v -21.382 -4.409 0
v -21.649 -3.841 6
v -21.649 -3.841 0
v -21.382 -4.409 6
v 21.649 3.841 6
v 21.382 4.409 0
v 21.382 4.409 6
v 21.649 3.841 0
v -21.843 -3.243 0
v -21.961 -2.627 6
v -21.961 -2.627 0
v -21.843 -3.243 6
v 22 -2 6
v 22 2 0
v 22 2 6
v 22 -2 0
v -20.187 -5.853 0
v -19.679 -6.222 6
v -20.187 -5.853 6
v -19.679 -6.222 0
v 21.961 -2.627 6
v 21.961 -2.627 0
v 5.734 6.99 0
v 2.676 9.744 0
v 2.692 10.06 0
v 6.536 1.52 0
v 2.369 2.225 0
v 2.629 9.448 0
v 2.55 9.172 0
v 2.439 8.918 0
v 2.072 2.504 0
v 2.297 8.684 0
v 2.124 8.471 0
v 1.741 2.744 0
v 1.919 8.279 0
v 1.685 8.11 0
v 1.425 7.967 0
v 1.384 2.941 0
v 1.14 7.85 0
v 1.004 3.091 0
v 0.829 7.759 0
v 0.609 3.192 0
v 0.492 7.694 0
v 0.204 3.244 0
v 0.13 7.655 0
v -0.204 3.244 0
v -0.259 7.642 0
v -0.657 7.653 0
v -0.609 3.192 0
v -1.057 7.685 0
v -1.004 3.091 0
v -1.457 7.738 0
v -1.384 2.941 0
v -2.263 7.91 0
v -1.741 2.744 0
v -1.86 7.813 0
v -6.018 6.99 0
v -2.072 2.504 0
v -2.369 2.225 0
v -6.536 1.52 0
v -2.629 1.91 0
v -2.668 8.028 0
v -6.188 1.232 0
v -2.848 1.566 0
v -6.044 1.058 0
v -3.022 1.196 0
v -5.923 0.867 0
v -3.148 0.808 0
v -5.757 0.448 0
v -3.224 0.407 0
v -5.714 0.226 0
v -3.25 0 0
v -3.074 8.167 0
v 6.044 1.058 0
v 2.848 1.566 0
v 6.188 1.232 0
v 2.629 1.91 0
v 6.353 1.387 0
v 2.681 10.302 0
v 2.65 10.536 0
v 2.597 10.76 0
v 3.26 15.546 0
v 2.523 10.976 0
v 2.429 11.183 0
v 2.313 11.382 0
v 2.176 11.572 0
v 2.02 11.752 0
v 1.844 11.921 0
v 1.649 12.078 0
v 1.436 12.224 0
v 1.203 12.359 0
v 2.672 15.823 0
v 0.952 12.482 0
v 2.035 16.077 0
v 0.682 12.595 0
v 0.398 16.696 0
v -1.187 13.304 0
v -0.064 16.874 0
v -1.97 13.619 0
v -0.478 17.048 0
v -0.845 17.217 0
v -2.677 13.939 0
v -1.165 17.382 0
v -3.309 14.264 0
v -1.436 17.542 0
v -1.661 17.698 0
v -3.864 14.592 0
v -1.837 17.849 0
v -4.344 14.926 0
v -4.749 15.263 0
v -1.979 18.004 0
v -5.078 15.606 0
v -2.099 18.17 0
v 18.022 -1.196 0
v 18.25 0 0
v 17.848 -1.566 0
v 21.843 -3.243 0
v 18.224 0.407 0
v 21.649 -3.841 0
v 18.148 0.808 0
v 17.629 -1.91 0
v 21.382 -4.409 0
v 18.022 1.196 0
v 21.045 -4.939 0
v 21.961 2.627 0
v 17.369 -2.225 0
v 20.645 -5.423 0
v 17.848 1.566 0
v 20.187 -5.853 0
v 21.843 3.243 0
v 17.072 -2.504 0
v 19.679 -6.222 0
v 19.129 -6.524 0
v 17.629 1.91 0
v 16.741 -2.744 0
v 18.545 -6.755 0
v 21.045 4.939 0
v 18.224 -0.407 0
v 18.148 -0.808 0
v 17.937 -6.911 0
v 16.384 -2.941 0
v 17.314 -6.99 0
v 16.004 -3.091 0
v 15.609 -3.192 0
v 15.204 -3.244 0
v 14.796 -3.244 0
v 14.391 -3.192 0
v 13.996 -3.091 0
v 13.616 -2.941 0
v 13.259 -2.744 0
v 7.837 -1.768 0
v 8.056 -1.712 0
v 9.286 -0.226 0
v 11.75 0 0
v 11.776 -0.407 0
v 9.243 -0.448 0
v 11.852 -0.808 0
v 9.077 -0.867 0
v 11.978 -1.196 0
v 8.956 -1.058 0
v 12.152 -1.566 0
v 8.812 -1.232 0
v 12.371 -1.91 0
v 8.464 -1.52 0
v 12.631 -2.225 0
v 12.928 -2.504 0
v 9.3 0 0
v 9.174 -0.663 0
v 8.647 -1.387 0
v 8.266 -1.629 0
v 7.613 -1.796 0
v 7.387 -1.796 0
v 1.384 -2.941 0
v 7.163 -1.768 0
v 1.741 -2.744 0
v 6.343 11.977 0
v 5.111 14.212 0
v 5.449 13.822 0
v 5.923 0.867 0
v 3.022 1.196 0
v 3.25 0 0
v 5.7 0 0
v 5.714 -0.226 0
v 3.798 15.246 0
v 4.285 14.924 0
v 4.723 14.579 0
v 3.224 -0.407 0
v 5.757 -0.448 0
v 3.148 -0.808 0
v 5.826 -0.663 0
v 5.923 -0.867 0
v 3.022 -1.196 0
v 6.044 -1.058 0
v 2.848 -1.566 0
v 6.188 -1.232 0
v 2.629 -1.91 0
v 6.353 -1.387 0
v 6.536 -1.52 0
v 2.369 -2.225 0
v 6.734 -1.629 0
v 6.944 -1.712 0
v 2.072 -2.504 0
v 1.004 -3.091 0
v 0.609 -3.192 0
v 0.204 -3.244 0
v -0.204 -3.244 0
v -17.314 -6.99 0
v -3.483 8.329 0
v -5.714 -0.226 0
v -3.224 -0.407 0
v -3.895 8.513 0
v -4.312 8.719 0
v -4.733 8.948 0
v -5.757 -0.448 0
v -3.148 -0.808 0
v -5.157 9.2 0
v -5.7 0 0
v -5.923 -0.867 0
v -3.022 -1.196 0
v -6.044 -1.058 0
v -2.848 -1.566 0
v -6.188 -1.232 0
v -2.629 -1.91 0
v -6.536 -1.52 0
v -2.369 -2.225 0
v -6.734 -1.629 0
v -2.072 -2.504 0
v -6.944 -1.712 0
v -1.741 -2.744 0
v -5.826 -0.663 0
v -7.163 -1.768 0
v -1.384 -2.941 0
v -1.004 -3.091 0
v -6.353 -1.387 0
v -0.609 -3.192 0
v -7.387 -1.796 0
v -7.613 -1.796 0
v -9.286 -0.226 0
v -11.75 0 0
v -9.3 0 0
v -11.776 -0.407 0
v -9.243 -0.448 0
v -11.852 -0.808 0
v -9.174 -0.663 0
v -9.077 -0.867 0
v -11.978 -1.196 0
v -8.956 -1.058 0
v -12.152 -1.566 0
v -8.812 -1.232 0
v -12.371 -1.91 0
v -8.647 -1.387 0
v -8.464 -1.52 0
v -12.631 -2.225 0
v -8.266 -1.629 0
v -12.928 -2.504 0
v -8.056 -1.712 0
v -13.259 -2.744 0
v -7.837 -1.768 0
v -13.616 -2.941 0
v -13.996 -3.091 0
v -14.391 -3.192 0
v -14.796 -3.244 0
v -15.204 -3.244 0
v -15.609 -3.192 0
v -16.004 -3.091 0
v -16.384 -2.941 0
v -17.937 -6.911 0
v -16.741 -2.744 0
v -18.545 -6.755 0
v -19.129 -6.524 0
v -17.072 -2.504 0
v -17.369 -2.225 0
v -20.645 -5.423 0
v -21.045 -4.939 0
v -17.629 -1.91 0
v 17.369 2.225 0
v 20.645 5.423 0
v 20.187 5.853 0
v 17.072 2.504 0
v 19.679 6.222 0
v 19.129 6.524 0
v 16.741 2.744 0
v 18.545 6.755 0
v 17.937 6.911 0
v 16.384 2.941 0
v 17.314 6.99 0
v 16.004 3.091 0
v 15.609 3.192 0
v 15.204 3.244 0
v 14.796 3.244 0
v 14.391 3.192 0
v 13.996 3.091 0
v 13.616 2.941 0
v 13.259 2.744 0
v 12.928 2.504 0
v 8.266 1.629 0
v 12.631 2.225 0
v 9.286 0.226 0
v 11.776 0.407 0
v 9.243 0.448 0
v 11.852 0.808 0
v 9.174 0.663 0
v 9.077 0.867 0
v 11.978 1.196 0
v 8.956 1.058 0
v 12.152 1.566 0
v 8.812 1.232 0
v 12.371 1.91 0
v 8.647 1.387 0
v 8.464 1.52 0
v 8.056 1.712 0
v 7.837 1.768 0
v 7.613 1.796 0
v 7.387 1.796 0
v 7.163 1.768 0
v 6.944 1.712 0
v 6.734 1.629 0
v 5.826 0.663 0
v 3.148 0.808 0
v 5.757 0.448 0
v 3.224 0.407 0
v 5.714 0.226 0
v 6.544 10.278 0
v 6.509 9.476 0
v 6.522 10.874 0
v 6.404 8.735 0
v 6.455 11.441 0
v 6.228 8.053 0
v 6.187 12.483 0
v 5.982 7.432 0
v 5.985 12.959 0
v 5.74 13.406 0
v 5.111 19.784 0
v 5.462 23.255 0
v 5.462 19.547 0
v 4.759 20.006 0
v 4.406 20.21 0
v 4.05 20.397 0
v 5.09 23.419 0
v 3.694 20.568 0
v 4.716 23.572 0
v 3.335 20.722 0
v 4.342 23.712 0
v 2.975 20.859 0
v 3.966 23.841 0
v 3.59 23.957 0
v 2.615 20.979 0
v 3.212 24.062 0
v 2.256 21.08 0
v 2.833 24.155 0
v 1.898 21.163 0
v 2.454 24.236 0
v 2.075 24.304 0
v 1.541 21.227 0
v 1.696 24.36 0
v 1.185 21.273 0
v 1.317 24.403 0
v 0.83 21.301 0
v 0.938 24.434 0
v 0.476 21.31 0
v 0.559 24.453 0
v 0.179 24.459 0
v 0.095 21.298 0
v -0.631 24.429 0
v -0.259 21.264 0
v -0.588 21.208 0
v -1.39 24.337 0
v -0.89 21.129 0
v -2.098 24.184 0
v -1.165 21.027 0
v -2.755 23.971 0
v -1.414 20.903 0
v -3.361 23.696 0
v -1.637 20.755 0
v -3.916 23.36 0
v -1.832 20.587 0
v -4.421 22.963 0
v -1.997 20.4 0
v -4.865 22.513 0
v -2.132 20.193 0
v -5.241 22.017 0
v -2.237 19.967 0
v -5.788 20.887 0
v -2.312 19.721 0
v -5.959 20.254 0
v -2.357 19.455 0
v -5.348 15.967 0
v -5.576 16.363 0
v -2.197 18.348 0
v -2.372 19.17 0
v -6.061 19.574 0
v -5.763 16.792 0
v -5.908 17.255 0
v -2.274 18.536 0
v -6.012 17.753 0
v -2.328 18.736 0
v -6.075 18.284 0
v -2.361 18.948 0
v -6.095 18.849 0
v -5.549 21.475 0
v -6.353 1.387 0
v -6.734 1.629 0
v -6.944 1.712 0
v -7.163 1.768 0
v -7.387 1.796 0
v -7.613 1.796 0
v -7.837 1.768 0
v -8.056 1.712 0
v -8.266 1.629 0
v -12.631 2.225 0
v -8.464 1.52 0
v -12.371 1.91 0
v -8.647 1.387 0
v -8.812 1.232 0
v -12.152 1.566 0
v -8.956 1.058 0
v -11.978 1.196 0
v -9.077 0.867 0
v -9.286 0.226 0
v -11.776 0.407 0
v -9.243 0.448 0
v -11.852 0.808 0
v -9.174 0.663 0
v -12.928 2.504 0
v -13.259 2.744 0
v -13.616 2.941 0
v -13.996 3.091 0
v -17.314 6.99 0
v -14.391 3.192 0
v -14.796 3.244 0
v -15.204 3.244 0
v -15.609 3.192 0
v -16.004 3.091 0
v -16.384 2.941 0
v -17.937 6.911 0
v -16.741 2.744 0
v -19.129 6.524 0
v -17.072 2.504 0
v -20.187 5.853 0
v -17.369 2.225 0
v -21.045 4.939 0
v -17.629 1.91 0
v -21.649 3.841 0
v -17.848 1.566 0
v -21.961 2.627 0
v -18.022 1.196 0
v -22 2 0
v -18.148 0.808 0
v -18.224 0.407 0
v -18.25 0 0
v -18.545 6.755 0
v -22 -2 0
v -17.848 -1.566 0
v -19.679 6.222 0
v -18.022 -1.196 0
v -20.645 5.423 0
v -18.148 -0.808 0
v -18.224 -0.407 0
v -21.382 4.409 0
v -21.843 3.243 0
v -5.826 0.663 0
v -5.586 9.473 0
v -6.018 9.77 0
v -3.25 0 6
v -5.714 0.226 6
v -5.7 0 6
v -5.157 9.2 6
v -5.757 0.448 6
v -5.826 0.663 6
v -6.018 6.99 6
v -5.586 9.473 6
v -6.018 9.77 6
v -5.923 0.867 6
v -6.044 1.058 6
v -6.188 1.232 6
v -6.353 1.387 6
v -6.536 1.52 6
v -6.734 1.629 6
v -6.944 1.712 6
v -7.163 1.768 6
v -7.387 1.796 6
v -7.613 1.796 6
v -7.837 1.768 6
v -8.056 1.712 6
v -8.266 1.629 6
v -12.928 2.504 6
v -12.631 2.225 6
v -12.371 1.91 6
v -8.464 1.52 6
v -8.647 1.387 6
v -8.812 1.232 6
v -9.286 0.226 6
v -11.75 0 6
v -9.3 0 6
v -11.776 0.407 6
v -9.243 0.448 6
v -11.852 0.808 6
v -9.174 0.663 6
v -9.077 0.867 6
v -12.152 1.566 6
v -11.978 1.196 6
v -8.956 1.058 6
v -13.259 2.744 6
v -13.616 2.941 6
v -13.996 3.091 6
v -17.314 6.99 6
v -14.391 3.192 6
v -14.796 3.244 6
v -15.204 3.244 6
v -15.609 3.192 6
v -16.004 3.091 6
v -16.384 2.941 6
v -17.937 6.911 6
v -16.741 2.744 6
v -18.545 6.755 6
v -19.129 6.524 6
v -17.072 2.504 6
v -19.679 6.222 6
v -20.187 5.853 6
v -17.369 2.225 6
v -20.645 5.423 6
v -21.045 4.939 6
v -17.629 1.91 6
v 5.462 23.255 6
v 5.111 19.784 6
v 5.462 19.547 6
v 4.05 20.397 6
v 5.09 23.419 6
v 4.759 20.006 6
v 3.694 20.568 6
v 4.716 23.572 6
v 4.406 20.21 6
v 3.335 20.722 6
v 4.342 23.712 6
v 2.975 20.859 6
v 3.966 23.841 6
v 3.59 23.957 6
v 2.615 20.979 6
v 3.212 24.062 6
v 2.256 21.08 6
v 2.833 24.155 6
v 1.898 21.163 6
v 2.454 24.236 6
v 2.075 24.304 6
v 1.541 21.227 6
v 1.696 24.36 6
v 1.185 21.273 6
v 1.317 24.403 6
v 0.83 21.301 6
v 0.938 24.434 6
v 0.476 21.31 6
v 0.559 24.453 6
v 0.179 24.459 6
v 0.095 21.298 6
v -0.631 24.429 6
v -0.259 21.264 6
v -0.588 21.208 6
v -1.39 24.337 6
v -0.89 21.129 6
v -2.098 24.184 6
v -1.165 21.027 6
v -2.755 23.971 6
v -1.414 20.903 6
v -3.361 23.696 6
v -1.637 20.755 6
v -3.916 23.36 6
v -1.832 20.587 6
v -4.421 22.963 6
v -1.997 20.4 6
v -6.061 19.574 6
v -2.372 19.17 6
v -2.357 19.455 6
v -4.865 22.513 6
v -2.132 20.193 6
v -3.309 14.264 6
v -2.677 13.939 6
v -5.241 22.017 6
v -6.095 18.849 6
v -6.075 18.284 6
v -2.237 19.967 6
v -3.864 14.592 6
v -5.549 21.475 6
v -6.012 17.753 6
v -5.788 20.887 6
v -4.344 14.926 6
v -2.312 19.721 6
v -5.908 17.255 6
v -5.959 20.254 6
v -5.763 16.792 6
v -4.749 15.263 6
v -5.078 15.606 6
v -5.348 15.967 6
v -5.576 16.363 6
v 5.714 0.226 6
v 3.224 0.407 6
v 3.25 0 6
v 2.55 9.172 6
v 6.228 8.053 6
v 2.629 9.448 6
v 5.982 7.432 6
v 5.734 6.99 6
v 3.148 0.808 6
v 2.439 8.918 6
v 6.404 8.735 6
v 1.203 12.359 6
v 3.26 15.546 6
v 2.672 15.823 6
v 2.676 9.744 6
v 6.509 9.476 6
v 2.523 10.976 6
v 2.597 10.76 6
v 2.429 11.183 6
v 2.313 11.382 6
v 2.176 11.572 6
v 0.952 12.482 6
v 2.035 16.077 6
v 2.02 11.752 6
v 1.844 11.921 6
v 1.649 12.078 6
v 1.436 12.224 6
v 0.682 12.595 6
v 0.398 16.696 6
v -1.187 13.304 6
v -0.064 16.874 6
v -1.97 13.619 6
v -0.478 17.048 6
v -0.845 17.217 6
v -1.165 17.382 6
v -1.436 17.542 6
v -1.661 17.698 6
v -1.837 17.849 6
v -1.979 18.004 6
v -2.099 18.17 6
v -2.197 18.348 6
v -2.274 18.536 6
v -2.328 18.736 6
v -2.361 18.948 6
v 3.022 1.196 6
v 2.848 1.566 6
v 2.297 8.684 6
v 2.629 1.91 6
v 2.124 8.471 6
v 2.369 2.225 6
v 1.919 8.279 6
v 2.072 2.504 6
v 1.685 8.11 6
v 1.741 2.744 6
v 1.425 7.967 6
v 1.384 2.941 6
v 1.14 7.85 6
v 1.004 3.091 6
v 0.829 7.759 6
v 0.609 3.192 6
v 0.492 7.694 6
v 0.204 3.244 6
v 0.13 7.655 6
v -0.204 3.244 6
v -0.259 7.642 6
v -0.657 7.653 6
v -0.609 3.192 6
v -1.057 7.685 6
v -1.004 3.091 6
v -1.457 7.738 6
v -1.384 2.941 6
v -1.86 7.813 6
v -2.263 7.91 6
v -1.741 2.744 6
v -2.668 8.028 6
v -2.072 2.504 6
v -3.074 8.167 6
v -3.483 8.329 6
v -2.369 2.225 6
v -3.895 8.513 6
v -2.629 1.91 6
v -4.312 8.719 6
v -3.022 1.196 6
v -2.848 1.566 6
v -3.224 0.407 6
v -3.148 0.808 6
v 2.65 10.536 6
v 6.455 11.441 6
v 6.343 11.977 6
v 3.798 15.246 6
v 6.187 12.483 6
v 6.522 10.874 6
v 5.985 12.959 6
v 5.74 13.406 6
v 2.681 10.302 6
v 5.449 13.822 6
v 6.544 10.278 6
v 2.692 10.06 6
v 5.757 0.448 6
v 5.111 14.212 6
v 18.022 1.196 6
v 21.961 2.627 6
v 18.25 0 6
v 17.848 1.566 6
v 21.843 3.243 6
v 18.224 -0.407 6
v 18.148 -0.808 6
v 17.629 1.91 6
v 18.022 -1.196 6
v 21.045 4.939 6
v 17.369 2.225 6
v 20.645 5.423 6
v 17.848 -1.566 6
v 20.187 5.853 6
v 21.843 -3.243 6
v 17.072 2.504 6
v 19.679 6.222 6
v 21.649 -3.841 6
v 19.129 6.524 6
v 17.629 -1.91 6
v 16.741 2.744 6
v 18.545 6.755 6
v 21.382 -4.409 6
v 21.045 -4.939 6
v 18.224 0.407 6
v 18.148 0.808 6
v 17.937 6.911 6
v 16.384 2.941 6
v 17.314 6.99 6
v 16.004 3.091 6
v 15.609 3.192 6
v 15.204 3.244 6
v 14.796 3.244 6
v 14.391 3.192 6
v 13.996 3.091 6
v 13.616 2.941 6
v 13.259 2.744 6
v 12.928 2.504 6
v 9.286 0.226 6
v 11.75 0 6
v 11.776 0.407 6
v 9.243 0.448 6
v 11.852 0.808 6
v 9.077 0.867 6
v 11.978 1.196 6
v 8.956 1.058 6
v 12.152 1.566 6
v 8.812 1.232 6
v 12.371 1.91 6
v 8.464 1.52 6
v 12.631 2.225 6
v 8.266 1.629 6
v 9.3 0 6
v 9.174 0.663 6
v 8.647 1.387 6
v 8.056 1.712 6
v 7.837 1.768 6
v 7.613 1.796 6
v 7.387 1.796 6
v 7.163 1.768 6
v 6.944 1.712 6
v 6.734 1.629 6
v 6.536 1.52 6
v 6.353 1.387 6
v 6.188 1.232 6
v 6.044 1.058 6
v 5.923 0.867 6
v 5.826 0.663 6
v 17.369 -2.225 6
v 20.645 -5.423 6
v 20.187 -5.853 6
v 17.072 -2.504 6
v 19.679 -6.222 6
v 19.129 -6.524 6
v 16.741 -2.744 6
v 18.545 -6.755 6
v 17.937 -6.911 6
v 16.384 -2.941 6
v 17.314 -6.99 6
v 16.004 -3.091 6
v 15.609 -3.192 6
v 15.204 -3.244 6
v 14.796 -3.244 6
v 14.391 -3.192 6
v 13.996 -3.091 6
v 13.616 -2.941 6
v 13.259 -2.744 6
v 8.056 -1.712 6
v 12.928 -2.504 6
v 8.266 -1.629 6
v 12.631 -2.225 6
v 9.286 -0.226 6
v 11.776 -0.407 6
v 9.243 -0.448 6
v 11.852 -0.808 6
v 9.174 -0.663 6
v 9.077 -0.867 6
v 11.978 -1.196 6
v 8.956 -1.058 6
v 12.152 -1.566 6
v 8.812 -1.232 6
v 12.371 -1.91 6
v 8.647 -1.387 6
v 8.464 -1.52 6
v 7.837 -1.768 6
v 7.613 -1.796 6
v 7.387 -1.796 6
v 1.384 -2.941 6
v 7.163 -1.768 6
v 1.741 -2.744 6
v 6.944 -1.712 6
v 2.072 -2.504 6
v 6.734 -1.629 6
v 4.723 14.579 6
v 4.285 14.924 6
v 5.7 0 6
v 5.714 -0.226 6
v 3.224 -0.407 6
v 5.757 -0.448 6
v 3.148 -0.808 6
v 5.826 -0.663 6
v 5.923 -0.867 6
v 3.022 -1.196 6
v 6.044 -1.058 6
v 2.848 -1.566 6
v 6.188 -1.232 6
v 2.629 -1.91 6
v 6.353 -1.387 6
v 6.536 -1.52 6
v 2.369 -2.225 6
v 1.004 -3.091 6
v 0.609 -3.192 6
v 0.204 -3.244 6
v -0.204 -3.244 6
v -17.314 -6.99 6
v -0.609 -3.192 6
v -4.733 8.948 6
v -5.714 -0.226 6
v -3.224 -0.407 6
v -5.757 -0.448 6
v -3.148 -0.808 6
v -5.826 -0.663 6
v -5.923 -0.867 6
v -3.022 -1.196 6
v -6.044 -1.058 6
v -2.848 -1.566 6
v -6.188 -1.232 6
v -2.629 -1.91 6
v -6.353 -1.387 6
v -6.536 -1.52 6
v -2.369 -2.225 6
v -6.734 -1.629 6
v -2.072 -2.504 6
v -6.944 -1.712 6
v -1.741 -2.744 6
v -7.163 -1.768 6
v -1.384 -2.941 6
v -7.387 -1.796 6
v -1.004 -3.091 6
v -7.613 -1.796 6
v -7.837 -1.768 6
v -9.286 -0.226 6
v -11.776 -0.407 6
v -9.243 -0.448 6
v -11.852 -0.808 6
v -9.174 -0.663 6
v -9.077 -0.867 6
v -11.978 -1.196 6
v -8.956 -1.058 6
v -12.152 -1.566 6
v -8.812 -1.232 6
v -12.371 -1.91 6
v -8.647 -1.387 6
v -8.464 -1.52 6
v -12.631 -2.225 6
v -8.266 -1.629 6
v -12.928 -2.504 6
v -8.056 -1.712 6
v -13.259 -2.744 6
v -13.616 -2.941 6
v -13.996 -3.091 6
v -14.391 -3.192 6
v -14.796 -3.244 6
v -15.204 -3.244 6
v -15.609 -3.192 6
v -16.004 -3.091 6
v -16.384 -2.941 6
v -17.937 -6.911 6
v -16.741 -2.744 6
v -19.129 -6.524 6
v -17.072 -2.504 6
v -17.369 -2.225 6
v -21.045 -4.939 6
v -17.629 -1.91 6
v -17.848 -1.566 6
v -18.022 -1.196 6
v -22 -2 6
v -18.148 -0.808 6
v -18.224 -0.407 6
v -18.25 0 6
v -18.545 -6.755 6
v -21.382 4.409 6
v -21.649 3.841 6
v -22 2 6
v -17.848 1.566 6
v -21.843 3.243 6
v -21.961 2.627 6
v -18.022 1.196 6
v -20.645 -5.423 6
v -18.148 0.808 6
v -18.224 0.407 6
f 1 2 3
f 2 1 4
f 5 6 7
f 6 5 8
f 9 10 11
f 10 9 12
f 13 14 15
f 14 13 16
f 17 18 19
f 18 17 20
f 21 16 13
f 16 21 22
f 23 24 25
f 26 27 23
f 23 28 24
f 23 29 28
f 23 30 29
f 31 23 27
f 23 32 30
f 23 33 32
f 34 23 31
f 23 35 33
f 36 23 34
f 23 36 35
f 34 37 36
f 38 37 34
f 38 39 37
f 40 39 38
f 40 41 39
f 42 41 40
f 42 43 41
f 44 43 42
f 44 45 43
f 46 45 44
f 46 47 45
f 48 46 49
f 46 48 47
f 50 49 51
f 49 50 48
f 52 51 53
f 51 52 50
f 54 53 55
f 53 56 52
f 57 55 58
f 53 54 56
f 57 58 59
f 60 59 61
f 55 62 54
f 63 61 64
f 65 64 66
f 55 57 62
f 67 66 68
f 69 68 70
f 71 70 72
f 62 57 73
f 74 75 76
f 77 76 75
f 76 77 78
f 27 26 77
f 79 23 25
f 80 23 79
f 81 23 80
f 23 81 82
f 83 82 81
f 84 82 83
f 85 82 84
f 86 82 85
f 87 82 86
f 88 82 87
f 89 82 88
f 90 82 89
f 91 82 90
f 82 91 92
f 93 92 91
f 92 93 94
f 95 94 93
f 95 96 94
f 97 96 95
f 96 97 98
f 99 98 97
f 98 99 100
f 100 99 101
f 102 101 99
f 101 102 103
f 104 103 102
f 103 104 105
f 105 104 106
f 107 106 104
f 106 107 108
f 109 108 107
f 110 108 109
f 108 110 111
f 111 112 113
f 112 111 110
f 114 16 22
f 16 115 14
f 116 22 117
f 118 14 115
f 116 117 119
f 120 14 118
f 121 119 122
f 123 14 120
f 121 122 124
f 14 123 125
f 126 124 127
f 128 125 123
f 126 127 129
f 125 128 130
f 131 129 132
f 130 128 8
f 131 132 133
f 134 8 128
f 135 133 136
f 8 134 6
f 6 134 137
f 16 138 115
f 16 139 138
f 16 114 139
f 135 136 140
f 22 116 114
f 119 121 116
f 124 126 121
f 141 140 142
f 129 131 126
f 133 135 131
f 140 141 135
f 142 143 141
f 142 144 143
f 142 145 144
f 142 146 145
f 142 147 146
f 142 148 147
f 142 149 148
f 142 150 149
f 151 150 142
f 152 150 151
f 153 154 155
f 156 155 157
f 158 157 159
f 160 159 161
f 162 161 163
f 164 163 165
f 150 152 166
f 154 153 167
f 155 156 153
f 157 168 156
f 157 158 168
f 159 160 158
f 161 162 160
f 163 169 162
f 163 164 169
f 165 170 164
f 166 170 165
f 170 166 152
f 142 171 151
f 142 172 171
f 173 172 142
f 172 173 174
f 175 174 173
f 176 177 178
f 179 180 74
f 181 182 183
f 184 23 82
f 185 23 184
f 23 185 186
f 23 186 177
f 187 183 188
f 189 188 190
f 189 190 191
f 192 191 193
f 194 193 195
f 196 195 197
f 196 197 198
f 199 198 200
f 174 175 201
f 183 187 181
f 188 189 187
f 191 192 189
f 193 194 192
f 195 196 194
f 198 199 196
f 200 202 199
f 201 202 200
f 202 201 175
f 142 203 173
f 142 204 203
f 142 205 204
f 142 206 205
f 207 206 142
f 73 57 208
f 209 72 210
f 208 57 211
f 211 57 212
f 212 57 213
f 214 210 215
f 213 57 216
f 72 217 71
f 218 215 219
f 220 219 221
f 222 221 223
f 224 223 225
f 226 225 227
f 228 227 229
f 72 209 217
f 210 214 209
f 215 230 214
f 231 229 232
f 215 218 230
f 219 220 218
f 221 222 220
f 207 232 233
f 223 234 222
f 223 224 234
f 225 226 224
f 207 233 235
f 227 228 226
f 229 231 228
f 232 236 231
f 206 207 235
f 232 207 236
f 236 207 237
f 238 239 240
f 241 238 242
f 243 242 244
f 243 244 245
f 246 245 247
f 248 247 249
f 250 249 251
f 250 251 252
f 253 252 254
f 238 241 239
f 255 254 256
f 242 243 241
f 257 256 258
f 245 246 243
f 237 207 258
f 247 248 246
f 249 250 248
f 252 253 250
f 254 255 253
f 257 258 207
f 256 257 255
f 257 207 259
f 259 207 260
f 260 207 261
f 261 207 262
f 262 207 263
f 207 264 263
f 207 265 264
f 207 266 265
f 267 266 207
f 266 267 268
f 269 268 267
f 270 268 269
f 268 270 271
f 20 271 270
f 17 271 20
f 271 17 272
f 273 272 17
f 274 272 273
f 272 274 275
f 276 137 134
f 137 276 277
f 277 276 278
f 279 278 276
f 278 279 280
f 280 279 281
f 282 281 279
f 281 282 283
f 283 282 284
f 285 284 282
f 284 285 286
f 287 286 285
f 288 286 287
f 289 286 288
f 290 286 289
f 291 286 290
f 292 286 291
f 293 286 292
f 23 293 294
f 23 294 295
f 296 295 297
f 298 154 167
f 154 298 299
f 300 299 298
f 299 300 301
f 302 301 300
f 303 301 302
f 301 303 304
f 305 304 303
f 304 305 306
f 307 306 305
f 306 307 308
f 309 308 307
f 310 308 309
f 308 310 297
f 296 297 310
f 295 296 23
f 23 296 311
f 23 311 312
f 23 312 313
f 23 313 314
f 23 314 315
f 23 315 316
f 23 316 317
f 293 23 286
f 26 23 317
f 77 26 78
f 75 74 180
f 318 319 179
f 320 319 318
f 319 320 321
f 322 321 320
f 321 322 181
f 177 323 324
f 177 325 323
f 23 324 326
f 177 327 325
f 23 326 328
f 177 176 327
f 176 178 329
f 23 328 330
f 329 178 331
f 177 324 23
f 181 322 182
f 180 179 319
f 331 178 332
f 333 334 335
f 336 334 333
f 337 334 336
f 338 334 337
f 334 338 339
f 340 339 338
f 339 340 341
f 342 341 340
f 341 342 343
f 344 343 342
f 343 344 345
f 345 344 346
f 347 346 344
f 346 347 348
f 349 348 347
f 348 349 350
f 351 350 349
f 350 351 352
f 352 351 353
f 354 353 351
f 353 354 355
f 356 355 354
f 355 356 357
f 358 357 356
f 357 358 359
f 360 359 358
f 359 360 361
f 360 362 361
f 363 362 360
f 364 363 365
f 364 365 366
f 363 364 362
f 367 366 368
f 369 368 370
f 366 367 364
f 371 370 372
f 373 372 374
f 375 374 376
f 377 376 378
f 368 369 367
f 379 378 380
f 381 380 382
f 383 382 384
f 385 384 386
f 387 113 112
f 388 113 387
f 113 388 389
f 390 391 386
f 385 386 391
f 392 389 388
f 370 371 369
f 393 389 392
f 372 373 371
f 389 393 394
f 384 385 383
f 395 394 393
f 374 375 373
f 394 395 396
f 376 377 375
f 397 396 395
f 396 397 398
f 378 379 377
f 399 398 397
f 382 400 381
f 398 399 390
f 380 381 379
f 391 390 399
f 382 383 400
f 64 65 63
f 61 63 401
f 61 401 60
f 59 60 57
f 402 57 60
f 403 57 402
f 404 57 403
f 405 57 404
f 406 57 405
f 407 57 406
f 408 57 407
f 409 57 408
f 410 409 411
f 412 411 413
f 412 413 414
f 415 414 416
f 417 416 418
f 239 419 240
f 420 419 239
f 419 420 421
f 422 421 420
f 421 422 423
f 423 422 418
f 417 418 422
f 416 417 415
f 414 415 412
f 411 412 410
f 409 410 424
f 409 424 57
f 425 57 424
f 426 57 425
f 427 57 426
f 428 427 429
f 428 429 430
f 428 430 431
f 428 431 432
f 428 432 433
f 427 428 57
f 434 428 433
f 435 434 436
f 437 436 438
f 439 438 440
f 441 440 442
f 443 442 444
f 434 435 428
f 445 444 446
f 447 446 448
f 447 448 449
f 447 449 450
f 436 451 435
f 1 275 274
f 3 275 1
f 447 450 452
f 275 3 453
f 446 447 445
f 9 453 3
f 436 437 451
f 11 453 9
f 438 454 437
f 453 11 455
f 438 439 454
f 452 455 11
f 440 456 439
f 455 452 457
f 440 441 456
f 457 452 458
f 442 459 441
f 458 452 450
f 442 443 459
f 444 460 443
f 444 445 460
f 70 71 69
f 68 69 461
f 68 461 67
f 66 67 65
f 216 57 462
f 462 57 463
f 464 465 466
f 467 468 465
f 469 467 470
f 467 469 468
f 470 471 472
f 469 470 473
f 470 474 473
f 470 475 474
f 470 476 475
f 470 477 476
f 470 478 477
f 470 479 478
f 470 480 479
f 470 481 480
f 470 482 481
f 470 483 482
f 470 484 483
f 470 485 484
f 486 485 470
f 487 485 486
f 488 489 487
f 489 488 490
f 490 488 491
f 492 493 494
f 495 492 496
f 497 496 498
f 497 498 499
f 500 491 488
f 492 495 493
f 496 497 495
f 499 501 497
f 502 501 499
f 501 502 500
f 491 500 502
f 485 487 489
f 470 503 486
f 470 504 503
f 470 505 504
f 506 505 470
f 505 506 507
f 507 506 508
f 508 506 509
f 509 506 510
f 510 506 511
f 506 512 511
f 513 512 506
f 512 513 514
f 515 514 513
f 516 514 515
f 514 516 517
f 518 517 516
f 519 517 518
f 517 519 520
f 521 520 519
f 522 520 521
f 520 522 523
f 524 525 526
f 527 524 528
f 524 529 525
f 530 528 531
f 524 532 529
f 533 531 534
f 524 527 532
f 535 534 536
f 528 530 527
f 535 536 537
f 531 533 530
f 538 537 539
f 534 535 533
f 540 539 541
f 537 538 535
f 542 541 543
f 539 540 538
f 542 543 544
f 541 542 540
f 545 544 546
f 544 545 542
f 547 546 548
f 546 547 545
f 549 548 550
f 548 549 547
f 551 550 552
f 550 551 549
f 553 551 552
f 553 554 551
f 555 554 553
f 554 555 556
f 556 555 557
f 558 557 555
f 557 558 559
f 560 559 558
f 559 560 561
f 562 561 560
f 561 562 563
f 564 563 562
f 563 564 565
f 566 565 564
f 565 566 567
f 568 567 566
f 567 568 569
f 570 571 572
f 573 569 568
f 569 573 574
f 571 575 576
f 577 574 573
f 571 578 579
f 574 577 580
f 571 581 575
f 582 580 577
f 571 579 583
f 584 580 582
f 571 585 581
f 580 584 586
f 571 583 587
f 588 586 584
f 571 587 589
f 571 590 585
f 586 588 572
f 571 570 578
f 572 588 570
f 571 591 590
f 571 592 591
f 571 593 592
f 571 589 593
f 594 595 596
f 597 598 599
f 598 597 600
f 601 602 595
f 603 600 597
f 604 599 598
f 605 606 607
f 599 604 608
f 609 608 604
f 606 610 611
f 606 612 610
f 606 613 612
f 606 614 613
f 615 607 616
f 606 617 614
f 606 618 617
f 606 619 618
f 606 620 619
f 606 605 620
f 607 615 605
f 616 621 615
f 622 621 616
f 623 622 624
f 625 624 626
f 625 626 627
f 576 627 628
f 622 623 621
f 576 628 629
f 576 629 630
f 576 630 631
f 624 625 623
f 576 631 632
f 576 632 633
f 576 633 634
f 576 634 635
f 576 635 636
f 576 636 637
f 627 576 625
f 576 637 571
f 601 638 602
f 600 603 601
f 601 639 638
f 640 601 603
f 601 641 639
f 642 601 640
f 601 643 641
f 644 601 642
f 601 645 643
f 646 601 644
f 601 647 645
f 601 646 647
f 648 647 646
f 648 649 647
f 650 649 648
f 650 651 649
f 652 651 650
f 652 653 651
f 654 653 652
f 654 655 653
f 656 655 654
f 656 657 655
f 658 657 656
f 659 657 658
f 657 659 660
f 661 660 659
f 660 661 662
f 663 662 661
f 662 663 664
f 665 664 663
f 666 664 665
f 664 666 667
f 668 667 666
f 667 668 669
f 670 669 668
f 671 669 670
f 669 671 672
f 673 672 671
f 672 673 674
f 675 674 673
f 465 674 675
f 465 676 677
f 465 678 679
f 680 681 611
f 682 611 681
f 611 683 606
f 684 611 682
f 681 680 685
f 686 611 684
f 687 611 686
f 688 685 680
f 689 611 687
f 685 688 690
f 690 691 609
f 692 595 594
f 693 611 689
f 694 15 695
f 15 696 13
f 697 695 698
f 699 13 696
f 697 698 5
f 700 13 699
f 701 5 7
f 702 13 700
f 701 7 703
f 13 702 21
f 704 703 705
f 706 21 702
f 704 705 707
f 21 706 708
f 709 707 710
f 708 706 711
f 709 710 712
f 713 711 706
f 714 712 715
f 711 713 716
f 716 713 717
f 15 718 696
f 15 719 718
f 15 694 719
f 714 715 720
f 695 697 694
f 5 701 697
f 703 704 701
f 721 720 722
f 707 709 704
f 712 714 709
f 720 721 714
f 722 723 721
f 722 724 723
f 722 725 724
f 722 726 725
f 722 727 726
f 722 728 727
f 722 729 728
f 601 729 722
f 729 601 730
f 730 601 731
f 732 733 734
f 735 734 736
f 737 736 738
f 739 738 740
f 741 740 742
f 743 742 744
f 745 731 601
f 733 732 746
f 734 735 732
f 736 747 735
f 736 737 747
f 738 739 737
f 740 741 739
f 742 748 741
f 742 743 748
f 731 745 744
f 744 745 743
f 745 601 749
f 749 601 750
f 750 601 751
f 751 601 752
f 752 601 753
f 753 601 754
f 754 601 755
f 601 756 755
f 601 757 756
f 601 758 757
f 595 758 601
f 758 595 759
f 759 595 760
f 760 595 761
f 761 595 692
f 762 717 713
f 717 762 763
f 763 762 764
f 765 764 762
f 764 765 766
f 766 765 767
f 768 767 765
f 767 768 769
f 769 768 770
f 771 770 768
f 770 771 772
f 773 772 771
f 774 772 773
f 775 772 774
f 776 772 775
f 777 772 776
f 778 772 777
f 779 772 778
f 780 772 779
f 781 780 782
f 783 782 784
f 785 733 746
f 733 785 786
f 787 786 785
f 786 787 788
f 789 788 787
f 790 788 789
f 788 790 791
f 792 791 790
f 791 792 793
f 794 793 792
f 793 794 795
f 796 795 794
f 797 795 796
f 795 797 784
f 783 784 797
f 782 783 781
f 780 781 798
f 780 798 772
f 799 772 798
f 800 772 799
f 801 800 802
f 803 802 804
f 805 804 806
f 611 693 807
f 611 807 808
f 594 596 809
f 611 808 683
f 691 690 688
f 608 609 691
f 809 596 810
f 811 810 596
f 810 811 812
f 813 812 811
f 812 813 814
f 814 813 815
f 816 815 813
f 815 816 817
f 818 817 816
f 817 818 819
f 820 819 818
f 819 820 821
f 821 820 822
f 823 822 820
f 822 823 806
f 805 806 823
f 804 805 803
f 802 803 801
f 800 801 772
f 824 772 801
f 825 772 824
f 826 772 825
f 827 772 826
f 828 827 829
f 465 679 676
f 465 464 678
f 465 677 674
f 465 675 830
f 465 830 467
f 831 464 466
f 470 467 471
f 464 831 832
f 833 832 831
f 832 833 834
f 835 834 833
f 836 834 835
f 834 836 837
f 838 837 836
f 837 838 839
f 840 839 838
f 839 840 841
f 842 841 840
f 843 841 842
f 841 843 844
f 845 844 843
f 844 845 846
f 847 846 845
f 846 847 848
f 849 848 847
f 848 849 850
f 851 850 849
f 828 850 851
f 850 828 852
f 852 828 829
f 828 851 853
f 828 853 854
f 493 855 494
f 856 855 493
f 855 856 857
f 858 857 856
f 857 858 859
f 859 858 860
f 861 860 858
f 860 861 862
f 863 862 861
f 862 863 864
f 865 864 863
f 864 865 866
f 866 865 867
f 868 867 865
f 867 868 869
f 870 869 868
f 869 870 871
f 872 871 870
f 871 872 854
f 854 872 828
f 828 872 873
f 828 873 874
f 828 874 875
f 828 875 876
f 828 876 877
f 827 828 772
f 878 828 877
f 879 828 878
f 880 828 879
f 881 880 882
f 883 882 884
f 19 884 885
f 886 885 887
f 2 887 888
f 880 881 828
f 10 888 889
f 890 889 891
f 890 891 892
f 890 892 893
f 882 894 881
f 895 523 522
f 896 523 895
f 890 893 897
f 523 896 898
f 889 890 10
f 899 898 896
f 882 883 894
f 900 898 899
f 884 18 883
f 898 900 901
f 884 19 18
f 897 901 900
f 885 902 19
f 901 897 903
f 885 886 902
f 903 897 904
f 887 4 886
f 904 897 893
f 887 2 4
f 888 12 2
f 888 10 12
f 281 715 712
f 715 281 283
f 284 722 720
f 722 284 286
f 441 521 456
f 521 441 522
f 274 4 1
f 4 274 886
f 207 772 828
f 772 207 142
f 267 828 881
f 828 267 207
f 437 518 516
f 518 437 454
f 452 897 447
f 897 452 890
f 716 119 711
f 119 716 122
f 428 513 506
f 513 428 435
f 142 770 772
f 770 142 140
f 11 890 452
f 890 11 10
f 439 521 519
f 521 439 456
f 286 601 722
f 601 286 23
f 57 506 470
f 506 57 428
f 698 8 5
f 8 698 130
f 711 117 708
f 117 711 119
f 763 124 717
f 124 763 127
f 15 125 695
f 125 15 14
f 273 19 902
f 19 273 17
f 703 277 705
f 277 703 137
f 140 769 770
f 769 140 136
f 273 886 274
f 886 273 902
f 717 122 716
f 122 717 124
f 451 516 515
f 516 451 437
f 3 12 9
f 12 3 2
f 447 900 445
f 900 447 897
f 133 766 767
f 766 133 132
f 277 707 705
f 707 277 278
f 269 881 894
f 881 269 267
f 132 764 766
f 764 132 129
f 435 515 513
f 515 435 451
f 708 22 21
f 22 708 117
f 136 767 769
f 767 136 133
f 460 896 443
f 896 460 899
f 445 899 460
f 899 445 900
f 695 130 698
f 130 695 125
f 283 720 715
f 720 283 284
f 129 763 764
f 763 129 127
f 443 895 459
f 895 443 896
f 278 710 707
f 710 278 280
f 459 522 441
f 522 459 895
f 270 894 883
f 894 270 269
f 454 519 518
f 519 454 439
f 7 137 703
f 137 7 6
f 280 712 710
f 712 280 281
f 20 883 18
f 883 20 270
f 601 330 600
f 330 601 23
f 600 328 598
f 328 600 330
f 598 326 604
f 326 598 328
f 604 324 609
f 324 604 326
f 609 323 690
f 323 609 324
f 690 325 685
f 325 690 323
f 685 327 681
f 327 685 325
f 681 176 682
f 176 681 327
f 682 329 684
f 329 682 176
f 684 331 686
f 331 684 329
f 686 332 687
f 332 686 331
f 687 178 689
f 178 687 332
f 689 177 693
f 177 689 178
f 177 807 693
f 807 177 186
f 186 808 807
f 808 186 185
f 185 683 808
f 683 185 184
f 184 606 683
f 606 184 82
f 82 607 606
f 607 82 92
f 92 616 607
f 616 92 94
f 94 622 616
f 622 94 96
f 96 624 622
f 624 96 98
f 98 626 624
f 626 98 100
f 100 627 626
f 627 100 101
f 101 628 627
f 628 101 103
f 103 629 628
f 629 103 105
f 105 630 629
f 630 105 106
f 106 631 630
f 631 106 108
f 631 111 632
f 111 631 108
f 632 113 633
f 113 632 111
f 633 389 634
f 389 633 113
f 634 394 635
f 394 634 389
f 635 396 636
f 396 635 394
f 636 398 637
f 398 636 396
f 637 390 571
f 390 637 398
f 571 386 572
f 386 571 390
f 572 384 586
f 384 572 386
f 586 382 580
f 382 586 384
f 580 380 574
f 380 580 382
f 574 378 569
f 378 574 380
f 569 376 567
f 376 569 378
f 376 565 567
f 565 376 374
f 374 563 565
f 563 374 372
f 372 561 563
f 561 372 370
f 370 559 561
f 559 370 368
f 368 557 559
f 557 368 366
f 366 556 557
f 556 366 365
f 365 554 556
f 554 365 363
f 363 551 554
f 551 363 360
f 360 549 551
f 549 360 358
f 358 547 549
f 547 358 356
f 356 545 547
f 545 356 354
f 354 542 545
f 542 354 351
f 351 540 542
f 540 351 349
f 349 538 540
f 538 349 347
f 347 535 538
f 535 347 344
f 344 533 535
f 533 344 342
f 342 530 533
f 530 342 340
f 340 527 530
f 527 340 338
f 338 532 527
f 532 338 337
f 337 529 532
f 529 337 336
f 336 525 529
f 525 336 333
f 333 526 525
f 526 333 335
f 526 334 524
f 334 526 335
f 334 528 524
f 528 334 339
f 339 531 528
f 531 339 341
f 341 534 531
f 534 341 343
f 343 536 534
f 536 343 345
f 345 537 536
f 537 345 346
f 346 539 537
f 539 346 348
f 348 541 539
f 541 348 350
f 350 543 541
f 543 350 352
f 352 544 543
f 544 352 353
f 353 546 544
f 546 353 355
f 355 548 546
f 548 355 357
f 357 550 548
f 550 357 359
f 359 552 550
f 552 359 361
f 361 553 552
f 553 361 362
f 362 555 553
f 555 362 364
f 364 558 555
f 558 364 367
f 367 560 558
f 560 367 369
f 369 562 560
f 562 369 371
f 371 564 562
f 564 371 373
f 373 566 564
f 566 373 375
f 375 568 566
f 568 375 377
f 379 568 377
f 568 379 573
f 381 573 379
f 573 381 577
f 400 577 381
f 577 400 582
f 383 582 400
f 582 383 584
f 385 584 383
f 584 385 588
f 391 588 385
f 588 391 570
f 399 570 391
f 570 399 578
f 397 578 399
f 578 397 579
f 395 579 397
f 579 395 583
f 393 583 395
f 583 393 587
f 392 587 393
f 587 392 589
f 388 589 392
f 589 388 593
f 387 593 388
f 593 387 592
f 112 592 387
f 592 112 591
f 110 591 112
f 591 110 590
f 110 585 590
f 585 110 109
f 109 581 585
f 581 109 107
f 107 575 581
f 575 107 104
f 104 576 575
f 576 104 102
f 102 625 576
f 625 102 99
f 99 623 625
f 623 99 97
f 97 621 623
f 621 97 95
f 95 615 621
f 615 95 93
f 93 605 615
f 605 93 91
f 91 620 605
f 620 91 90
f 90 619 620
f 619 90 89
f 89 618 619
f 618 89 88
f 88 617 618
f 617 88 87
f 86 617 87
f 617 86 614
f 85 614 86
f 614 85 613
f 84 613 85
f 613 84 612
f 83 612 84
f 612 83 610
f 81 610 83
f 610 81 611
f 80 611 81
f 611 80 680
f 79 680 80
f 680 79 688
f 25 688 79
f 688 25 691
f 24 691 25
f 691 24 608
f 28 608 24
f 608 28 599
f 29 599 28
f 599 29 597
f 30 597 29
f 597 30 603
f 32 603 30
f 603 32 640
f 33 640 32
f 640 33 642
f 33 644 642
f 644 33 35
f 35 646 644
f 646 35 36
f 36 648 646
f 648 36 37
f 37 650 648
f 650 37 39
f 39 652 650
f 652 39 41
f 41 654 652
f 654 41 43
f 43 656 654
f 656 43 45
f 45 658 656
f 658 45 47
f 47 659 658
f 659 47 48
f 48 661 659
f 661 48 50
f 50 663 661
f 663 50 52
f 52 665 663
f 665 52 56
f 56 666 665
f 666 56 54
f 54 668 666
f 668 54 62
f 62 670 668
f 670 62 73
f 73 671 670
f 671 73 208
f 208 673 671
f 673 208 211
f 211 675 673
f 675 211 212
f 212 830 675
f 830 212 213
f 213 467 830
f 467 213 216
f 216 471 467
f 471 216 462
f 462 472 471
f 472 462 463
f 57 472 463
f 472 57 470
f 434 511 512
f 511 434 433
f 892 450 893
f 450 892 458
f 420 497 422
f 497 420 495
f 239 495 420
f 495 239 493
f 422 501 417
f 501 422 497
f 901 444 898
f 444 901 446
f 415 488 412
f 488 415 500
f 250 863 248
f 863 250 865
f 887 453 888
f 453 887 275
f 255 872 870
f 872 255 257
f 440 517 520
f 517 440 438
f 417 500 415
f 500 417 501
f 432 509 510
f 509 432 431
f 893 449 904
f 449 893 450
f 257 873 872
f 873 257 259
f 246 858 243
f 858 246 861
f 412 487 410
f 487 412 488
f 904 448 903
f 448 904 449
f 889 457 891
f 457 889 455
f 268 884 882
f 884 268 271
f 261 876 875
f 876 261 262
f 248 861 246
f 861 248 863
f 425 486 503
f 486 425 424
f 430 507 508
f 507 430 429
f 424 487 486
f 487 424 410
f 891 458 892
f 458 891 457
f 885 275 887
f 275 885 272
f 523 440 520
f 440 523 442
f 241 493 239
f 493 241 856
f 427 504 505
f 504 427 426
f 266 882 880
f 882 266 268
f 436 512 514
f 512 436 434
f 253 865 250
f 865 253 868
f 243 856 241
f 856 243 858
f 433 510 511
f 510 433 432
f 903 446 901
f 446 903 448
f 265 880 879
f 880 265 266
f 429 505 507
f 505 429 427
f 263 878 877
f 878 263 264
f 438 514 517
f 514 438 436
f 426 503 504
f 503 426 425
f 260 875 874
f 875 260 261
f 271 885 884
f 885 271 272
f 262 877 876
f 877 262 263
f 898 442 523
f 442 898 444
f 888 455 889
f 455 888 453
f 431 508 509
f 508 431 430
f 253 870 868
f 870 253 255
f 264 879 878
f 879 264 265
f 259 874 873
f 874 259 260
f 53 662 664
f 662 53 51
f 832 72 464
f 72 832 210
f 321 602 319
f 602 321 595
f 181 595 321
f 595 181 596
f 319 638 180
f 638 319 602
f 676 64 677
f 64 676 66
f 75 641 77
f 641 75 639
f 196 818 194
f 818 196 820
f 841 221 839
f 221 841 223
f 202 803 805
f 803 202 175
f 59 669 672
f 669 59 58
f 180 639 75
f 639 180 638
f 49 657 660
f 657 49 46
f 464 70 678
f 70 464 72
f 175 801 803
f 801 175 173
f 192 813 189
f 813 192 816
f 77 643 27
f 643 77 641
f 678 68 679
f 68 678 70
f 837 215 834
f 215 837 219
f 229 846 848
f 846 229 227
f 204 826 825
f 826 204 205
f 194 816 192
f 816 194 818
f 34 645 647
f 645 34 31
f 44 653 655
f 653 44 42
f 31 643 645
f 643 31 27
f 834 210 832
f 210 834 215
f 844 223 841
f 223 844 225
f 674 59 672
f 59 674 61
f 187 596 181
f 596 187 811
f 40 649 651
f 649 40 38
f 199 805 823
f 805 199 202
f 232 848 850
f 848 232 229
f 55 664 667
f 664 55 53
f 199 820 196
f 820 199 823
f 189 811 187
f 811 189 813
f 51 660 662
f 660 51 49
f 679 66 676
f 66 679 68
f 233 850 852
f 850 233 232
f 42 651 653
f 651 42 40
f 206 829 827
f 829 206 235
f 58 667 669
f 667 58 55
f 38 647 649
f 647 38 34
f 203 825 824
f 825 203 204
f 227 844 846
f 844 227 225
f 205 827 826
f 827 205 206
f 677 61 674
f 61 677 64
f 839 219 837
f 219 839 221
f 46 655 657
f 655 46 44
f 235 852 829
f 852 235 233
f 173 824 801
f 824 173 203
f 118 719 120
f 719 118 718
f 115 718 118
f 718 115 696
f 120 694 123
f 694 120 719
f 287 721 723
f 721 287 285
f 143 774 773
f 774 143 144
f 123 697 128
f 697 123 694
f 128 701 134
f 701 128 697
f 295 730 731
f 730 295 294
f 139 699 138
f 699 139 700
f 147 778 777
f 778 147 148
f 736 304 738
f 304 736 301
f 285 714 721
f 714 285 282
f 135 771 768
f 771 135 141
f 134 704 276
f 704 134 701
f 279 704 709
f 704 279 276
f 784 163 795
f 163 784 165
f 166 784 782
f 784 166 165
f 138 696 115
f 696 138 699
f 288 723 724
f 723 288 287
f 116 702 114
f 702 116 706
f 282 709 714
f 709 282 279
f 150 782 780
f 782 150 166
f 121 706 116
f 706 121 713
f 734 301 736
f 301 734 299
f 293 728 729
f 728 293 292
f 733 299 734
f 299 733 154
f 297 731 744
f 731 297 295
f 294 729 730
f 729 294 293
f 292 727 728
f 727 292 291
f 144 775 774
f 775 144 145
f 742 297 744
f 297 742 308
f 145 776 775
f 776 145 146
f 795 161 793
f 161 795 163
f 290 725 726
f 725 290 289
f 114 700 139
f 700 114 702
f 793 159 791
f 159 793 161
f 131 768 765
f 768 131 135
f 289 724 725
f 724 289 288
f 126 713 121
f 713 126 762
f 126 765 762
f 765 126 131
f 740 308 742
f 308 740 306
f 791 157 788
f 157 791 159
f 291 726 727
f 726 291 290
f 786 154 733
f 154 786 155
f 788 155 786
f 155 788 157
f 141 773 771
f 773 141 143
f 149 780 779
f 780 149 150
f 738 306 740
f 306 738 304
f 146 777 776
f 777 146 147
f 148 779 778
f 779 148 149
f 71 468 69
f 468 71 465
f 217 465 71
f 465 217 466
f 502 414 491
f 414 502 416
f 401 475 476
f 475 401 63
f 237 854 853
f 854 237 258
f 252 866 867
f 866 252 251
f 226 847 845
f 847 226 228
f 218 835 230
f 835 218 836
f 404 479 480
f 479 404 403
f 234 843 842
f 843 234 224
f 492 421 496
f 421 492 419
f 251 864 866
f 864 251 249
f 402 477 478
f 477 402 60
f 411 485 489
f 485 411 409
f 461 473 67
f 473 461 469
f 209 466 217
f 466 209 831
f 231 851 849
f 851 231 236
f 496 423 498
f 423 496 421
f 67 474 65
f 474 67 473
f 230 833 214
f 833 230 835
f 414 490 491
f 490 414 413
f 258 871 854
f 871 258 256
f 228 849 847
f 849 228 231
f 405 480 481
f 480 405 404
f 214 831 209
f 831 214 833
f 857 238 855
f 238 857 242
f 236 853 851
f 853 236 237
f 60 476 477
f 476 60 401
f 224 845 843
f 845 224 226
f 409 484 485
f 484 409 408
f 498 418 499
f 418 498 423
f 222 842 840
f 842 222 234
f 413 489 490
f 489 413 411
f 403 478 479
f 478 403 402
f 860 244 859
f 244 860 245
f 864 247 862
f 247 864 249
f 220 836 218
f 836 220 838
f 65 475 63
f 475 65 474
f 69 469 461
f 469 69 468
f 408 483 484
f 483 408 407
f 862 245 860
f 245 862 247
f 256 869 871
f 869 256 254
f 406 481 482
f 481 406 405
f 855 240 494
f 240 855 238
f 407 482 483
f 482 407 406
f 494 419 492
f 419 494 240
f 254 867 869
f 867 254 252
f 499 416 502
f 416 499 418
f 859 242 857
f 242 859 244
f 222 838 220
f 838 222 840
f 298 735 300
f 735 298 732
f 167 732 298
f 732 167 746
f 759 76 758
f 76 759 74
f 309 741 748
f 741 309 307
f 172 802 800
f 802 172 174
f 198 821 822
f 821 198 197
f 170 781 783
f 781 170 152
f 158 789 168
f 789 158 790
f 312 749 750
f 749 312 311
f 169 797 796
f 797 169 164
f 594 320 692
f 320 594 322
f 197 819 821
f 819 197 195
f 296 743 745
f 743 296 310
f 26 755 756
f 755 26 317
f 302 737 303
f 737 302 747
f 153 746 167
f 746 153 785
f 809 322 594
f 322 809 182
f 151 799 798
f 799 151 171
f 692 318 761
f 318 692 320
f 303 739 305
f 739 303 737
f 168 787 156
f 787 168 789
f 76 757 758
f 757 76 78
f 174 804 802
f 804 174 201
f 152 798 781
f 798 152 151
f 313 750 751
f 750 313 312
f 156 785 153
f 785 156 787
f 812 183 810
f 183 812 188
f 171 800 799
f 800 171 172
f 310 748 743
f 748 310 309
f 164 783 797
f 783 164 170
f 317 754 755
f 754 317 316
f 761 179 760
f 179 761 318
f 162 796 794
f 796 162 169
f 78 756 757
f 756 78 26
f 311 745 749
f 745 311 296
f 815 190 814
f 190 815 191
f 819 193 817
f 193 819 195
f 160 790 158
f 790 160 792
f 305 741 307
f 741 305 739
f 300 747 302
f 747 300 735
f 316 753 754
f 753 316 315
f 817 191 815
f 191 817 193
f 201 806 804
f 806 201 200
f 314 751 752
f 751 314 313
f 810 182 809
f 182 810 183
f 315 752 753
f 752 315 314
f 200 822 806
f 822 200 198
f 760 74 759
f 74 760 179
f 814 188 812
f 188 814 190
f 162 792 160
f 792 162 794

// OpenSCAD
$fn = 50;


difference() {
	union() {
		hull() {
			translate(v = [-17.0000000000, 2.0000000000, 0]) {
				cylinder(h = 6, r = 5);
			}
			translate(v = [17.0000000000, 2.0000000000, 0]) {
				cylinder(h = 6, r = 5);
			}
			translate(v = [-17.0000000000, -2.0000000000, 0]) {
				cylinder(h = 6, r = 5);
			}
			translate(v = [17.0000000000, -2.0000000000, 0]) {
				cylinder(h = 6, r = 5);
			}
		}
		translate(v = [0, 24, 0]) {
			linear_extrude(height = 6) {
				text(font = "DejaVu Sans Mono:style=Bold", halign = "center", size = 19.0000000000, text = "S", valign = "top");
			}
		}
	}
	union() {
		translate(v = [-15.0000000000, 0.0000000000, 0]) {
			translate(v = [0, 0, -100]) {
				cylinder(h = 200, r = 3.2500000000);
			}
		}
		translate(v = [0, 0, -100]) {
			cylinder(h = 200, r = 3.2500000000);
		}
		translate(v = [15.0000000000, 0.0000000000, 0]) {
			translate(v = [0, 0, -100]) {
				cylinder(h = 200, r = 3.2500000000);
			}
		}
		translate(v = [-15.0000000000, 0.0000000000, 0]) {
			translate(v = [0, 0, -100]) {
				cylinder(h = 200, r = 1.8000000000);
			}
		}
		translate(v = [-7.5000000000, 0.0000000000, 0]) {
			translate(v = [0, 0, -100]) {
				cylinder(h = 200, r = 1.8000000000);
			}
		}
		translate(v = [0, 0, -100]) {
			cylinder(h = 200, r = 1.8000000000);
		}
		translate(v = [7.5000000000, 0.0000000000, 0]) {
			translate(v = [0, 0, -100]) {
				cylinder(h = 200, r = 1.8000000000);
			}
		}
		translate(v = [15.0000000000, 0.0000000000, 0]) {
			translate(v = [0, 0, -100]) {
				cylinder(h = 200, r = 1.8000000000);
			}
		}
	}
}
